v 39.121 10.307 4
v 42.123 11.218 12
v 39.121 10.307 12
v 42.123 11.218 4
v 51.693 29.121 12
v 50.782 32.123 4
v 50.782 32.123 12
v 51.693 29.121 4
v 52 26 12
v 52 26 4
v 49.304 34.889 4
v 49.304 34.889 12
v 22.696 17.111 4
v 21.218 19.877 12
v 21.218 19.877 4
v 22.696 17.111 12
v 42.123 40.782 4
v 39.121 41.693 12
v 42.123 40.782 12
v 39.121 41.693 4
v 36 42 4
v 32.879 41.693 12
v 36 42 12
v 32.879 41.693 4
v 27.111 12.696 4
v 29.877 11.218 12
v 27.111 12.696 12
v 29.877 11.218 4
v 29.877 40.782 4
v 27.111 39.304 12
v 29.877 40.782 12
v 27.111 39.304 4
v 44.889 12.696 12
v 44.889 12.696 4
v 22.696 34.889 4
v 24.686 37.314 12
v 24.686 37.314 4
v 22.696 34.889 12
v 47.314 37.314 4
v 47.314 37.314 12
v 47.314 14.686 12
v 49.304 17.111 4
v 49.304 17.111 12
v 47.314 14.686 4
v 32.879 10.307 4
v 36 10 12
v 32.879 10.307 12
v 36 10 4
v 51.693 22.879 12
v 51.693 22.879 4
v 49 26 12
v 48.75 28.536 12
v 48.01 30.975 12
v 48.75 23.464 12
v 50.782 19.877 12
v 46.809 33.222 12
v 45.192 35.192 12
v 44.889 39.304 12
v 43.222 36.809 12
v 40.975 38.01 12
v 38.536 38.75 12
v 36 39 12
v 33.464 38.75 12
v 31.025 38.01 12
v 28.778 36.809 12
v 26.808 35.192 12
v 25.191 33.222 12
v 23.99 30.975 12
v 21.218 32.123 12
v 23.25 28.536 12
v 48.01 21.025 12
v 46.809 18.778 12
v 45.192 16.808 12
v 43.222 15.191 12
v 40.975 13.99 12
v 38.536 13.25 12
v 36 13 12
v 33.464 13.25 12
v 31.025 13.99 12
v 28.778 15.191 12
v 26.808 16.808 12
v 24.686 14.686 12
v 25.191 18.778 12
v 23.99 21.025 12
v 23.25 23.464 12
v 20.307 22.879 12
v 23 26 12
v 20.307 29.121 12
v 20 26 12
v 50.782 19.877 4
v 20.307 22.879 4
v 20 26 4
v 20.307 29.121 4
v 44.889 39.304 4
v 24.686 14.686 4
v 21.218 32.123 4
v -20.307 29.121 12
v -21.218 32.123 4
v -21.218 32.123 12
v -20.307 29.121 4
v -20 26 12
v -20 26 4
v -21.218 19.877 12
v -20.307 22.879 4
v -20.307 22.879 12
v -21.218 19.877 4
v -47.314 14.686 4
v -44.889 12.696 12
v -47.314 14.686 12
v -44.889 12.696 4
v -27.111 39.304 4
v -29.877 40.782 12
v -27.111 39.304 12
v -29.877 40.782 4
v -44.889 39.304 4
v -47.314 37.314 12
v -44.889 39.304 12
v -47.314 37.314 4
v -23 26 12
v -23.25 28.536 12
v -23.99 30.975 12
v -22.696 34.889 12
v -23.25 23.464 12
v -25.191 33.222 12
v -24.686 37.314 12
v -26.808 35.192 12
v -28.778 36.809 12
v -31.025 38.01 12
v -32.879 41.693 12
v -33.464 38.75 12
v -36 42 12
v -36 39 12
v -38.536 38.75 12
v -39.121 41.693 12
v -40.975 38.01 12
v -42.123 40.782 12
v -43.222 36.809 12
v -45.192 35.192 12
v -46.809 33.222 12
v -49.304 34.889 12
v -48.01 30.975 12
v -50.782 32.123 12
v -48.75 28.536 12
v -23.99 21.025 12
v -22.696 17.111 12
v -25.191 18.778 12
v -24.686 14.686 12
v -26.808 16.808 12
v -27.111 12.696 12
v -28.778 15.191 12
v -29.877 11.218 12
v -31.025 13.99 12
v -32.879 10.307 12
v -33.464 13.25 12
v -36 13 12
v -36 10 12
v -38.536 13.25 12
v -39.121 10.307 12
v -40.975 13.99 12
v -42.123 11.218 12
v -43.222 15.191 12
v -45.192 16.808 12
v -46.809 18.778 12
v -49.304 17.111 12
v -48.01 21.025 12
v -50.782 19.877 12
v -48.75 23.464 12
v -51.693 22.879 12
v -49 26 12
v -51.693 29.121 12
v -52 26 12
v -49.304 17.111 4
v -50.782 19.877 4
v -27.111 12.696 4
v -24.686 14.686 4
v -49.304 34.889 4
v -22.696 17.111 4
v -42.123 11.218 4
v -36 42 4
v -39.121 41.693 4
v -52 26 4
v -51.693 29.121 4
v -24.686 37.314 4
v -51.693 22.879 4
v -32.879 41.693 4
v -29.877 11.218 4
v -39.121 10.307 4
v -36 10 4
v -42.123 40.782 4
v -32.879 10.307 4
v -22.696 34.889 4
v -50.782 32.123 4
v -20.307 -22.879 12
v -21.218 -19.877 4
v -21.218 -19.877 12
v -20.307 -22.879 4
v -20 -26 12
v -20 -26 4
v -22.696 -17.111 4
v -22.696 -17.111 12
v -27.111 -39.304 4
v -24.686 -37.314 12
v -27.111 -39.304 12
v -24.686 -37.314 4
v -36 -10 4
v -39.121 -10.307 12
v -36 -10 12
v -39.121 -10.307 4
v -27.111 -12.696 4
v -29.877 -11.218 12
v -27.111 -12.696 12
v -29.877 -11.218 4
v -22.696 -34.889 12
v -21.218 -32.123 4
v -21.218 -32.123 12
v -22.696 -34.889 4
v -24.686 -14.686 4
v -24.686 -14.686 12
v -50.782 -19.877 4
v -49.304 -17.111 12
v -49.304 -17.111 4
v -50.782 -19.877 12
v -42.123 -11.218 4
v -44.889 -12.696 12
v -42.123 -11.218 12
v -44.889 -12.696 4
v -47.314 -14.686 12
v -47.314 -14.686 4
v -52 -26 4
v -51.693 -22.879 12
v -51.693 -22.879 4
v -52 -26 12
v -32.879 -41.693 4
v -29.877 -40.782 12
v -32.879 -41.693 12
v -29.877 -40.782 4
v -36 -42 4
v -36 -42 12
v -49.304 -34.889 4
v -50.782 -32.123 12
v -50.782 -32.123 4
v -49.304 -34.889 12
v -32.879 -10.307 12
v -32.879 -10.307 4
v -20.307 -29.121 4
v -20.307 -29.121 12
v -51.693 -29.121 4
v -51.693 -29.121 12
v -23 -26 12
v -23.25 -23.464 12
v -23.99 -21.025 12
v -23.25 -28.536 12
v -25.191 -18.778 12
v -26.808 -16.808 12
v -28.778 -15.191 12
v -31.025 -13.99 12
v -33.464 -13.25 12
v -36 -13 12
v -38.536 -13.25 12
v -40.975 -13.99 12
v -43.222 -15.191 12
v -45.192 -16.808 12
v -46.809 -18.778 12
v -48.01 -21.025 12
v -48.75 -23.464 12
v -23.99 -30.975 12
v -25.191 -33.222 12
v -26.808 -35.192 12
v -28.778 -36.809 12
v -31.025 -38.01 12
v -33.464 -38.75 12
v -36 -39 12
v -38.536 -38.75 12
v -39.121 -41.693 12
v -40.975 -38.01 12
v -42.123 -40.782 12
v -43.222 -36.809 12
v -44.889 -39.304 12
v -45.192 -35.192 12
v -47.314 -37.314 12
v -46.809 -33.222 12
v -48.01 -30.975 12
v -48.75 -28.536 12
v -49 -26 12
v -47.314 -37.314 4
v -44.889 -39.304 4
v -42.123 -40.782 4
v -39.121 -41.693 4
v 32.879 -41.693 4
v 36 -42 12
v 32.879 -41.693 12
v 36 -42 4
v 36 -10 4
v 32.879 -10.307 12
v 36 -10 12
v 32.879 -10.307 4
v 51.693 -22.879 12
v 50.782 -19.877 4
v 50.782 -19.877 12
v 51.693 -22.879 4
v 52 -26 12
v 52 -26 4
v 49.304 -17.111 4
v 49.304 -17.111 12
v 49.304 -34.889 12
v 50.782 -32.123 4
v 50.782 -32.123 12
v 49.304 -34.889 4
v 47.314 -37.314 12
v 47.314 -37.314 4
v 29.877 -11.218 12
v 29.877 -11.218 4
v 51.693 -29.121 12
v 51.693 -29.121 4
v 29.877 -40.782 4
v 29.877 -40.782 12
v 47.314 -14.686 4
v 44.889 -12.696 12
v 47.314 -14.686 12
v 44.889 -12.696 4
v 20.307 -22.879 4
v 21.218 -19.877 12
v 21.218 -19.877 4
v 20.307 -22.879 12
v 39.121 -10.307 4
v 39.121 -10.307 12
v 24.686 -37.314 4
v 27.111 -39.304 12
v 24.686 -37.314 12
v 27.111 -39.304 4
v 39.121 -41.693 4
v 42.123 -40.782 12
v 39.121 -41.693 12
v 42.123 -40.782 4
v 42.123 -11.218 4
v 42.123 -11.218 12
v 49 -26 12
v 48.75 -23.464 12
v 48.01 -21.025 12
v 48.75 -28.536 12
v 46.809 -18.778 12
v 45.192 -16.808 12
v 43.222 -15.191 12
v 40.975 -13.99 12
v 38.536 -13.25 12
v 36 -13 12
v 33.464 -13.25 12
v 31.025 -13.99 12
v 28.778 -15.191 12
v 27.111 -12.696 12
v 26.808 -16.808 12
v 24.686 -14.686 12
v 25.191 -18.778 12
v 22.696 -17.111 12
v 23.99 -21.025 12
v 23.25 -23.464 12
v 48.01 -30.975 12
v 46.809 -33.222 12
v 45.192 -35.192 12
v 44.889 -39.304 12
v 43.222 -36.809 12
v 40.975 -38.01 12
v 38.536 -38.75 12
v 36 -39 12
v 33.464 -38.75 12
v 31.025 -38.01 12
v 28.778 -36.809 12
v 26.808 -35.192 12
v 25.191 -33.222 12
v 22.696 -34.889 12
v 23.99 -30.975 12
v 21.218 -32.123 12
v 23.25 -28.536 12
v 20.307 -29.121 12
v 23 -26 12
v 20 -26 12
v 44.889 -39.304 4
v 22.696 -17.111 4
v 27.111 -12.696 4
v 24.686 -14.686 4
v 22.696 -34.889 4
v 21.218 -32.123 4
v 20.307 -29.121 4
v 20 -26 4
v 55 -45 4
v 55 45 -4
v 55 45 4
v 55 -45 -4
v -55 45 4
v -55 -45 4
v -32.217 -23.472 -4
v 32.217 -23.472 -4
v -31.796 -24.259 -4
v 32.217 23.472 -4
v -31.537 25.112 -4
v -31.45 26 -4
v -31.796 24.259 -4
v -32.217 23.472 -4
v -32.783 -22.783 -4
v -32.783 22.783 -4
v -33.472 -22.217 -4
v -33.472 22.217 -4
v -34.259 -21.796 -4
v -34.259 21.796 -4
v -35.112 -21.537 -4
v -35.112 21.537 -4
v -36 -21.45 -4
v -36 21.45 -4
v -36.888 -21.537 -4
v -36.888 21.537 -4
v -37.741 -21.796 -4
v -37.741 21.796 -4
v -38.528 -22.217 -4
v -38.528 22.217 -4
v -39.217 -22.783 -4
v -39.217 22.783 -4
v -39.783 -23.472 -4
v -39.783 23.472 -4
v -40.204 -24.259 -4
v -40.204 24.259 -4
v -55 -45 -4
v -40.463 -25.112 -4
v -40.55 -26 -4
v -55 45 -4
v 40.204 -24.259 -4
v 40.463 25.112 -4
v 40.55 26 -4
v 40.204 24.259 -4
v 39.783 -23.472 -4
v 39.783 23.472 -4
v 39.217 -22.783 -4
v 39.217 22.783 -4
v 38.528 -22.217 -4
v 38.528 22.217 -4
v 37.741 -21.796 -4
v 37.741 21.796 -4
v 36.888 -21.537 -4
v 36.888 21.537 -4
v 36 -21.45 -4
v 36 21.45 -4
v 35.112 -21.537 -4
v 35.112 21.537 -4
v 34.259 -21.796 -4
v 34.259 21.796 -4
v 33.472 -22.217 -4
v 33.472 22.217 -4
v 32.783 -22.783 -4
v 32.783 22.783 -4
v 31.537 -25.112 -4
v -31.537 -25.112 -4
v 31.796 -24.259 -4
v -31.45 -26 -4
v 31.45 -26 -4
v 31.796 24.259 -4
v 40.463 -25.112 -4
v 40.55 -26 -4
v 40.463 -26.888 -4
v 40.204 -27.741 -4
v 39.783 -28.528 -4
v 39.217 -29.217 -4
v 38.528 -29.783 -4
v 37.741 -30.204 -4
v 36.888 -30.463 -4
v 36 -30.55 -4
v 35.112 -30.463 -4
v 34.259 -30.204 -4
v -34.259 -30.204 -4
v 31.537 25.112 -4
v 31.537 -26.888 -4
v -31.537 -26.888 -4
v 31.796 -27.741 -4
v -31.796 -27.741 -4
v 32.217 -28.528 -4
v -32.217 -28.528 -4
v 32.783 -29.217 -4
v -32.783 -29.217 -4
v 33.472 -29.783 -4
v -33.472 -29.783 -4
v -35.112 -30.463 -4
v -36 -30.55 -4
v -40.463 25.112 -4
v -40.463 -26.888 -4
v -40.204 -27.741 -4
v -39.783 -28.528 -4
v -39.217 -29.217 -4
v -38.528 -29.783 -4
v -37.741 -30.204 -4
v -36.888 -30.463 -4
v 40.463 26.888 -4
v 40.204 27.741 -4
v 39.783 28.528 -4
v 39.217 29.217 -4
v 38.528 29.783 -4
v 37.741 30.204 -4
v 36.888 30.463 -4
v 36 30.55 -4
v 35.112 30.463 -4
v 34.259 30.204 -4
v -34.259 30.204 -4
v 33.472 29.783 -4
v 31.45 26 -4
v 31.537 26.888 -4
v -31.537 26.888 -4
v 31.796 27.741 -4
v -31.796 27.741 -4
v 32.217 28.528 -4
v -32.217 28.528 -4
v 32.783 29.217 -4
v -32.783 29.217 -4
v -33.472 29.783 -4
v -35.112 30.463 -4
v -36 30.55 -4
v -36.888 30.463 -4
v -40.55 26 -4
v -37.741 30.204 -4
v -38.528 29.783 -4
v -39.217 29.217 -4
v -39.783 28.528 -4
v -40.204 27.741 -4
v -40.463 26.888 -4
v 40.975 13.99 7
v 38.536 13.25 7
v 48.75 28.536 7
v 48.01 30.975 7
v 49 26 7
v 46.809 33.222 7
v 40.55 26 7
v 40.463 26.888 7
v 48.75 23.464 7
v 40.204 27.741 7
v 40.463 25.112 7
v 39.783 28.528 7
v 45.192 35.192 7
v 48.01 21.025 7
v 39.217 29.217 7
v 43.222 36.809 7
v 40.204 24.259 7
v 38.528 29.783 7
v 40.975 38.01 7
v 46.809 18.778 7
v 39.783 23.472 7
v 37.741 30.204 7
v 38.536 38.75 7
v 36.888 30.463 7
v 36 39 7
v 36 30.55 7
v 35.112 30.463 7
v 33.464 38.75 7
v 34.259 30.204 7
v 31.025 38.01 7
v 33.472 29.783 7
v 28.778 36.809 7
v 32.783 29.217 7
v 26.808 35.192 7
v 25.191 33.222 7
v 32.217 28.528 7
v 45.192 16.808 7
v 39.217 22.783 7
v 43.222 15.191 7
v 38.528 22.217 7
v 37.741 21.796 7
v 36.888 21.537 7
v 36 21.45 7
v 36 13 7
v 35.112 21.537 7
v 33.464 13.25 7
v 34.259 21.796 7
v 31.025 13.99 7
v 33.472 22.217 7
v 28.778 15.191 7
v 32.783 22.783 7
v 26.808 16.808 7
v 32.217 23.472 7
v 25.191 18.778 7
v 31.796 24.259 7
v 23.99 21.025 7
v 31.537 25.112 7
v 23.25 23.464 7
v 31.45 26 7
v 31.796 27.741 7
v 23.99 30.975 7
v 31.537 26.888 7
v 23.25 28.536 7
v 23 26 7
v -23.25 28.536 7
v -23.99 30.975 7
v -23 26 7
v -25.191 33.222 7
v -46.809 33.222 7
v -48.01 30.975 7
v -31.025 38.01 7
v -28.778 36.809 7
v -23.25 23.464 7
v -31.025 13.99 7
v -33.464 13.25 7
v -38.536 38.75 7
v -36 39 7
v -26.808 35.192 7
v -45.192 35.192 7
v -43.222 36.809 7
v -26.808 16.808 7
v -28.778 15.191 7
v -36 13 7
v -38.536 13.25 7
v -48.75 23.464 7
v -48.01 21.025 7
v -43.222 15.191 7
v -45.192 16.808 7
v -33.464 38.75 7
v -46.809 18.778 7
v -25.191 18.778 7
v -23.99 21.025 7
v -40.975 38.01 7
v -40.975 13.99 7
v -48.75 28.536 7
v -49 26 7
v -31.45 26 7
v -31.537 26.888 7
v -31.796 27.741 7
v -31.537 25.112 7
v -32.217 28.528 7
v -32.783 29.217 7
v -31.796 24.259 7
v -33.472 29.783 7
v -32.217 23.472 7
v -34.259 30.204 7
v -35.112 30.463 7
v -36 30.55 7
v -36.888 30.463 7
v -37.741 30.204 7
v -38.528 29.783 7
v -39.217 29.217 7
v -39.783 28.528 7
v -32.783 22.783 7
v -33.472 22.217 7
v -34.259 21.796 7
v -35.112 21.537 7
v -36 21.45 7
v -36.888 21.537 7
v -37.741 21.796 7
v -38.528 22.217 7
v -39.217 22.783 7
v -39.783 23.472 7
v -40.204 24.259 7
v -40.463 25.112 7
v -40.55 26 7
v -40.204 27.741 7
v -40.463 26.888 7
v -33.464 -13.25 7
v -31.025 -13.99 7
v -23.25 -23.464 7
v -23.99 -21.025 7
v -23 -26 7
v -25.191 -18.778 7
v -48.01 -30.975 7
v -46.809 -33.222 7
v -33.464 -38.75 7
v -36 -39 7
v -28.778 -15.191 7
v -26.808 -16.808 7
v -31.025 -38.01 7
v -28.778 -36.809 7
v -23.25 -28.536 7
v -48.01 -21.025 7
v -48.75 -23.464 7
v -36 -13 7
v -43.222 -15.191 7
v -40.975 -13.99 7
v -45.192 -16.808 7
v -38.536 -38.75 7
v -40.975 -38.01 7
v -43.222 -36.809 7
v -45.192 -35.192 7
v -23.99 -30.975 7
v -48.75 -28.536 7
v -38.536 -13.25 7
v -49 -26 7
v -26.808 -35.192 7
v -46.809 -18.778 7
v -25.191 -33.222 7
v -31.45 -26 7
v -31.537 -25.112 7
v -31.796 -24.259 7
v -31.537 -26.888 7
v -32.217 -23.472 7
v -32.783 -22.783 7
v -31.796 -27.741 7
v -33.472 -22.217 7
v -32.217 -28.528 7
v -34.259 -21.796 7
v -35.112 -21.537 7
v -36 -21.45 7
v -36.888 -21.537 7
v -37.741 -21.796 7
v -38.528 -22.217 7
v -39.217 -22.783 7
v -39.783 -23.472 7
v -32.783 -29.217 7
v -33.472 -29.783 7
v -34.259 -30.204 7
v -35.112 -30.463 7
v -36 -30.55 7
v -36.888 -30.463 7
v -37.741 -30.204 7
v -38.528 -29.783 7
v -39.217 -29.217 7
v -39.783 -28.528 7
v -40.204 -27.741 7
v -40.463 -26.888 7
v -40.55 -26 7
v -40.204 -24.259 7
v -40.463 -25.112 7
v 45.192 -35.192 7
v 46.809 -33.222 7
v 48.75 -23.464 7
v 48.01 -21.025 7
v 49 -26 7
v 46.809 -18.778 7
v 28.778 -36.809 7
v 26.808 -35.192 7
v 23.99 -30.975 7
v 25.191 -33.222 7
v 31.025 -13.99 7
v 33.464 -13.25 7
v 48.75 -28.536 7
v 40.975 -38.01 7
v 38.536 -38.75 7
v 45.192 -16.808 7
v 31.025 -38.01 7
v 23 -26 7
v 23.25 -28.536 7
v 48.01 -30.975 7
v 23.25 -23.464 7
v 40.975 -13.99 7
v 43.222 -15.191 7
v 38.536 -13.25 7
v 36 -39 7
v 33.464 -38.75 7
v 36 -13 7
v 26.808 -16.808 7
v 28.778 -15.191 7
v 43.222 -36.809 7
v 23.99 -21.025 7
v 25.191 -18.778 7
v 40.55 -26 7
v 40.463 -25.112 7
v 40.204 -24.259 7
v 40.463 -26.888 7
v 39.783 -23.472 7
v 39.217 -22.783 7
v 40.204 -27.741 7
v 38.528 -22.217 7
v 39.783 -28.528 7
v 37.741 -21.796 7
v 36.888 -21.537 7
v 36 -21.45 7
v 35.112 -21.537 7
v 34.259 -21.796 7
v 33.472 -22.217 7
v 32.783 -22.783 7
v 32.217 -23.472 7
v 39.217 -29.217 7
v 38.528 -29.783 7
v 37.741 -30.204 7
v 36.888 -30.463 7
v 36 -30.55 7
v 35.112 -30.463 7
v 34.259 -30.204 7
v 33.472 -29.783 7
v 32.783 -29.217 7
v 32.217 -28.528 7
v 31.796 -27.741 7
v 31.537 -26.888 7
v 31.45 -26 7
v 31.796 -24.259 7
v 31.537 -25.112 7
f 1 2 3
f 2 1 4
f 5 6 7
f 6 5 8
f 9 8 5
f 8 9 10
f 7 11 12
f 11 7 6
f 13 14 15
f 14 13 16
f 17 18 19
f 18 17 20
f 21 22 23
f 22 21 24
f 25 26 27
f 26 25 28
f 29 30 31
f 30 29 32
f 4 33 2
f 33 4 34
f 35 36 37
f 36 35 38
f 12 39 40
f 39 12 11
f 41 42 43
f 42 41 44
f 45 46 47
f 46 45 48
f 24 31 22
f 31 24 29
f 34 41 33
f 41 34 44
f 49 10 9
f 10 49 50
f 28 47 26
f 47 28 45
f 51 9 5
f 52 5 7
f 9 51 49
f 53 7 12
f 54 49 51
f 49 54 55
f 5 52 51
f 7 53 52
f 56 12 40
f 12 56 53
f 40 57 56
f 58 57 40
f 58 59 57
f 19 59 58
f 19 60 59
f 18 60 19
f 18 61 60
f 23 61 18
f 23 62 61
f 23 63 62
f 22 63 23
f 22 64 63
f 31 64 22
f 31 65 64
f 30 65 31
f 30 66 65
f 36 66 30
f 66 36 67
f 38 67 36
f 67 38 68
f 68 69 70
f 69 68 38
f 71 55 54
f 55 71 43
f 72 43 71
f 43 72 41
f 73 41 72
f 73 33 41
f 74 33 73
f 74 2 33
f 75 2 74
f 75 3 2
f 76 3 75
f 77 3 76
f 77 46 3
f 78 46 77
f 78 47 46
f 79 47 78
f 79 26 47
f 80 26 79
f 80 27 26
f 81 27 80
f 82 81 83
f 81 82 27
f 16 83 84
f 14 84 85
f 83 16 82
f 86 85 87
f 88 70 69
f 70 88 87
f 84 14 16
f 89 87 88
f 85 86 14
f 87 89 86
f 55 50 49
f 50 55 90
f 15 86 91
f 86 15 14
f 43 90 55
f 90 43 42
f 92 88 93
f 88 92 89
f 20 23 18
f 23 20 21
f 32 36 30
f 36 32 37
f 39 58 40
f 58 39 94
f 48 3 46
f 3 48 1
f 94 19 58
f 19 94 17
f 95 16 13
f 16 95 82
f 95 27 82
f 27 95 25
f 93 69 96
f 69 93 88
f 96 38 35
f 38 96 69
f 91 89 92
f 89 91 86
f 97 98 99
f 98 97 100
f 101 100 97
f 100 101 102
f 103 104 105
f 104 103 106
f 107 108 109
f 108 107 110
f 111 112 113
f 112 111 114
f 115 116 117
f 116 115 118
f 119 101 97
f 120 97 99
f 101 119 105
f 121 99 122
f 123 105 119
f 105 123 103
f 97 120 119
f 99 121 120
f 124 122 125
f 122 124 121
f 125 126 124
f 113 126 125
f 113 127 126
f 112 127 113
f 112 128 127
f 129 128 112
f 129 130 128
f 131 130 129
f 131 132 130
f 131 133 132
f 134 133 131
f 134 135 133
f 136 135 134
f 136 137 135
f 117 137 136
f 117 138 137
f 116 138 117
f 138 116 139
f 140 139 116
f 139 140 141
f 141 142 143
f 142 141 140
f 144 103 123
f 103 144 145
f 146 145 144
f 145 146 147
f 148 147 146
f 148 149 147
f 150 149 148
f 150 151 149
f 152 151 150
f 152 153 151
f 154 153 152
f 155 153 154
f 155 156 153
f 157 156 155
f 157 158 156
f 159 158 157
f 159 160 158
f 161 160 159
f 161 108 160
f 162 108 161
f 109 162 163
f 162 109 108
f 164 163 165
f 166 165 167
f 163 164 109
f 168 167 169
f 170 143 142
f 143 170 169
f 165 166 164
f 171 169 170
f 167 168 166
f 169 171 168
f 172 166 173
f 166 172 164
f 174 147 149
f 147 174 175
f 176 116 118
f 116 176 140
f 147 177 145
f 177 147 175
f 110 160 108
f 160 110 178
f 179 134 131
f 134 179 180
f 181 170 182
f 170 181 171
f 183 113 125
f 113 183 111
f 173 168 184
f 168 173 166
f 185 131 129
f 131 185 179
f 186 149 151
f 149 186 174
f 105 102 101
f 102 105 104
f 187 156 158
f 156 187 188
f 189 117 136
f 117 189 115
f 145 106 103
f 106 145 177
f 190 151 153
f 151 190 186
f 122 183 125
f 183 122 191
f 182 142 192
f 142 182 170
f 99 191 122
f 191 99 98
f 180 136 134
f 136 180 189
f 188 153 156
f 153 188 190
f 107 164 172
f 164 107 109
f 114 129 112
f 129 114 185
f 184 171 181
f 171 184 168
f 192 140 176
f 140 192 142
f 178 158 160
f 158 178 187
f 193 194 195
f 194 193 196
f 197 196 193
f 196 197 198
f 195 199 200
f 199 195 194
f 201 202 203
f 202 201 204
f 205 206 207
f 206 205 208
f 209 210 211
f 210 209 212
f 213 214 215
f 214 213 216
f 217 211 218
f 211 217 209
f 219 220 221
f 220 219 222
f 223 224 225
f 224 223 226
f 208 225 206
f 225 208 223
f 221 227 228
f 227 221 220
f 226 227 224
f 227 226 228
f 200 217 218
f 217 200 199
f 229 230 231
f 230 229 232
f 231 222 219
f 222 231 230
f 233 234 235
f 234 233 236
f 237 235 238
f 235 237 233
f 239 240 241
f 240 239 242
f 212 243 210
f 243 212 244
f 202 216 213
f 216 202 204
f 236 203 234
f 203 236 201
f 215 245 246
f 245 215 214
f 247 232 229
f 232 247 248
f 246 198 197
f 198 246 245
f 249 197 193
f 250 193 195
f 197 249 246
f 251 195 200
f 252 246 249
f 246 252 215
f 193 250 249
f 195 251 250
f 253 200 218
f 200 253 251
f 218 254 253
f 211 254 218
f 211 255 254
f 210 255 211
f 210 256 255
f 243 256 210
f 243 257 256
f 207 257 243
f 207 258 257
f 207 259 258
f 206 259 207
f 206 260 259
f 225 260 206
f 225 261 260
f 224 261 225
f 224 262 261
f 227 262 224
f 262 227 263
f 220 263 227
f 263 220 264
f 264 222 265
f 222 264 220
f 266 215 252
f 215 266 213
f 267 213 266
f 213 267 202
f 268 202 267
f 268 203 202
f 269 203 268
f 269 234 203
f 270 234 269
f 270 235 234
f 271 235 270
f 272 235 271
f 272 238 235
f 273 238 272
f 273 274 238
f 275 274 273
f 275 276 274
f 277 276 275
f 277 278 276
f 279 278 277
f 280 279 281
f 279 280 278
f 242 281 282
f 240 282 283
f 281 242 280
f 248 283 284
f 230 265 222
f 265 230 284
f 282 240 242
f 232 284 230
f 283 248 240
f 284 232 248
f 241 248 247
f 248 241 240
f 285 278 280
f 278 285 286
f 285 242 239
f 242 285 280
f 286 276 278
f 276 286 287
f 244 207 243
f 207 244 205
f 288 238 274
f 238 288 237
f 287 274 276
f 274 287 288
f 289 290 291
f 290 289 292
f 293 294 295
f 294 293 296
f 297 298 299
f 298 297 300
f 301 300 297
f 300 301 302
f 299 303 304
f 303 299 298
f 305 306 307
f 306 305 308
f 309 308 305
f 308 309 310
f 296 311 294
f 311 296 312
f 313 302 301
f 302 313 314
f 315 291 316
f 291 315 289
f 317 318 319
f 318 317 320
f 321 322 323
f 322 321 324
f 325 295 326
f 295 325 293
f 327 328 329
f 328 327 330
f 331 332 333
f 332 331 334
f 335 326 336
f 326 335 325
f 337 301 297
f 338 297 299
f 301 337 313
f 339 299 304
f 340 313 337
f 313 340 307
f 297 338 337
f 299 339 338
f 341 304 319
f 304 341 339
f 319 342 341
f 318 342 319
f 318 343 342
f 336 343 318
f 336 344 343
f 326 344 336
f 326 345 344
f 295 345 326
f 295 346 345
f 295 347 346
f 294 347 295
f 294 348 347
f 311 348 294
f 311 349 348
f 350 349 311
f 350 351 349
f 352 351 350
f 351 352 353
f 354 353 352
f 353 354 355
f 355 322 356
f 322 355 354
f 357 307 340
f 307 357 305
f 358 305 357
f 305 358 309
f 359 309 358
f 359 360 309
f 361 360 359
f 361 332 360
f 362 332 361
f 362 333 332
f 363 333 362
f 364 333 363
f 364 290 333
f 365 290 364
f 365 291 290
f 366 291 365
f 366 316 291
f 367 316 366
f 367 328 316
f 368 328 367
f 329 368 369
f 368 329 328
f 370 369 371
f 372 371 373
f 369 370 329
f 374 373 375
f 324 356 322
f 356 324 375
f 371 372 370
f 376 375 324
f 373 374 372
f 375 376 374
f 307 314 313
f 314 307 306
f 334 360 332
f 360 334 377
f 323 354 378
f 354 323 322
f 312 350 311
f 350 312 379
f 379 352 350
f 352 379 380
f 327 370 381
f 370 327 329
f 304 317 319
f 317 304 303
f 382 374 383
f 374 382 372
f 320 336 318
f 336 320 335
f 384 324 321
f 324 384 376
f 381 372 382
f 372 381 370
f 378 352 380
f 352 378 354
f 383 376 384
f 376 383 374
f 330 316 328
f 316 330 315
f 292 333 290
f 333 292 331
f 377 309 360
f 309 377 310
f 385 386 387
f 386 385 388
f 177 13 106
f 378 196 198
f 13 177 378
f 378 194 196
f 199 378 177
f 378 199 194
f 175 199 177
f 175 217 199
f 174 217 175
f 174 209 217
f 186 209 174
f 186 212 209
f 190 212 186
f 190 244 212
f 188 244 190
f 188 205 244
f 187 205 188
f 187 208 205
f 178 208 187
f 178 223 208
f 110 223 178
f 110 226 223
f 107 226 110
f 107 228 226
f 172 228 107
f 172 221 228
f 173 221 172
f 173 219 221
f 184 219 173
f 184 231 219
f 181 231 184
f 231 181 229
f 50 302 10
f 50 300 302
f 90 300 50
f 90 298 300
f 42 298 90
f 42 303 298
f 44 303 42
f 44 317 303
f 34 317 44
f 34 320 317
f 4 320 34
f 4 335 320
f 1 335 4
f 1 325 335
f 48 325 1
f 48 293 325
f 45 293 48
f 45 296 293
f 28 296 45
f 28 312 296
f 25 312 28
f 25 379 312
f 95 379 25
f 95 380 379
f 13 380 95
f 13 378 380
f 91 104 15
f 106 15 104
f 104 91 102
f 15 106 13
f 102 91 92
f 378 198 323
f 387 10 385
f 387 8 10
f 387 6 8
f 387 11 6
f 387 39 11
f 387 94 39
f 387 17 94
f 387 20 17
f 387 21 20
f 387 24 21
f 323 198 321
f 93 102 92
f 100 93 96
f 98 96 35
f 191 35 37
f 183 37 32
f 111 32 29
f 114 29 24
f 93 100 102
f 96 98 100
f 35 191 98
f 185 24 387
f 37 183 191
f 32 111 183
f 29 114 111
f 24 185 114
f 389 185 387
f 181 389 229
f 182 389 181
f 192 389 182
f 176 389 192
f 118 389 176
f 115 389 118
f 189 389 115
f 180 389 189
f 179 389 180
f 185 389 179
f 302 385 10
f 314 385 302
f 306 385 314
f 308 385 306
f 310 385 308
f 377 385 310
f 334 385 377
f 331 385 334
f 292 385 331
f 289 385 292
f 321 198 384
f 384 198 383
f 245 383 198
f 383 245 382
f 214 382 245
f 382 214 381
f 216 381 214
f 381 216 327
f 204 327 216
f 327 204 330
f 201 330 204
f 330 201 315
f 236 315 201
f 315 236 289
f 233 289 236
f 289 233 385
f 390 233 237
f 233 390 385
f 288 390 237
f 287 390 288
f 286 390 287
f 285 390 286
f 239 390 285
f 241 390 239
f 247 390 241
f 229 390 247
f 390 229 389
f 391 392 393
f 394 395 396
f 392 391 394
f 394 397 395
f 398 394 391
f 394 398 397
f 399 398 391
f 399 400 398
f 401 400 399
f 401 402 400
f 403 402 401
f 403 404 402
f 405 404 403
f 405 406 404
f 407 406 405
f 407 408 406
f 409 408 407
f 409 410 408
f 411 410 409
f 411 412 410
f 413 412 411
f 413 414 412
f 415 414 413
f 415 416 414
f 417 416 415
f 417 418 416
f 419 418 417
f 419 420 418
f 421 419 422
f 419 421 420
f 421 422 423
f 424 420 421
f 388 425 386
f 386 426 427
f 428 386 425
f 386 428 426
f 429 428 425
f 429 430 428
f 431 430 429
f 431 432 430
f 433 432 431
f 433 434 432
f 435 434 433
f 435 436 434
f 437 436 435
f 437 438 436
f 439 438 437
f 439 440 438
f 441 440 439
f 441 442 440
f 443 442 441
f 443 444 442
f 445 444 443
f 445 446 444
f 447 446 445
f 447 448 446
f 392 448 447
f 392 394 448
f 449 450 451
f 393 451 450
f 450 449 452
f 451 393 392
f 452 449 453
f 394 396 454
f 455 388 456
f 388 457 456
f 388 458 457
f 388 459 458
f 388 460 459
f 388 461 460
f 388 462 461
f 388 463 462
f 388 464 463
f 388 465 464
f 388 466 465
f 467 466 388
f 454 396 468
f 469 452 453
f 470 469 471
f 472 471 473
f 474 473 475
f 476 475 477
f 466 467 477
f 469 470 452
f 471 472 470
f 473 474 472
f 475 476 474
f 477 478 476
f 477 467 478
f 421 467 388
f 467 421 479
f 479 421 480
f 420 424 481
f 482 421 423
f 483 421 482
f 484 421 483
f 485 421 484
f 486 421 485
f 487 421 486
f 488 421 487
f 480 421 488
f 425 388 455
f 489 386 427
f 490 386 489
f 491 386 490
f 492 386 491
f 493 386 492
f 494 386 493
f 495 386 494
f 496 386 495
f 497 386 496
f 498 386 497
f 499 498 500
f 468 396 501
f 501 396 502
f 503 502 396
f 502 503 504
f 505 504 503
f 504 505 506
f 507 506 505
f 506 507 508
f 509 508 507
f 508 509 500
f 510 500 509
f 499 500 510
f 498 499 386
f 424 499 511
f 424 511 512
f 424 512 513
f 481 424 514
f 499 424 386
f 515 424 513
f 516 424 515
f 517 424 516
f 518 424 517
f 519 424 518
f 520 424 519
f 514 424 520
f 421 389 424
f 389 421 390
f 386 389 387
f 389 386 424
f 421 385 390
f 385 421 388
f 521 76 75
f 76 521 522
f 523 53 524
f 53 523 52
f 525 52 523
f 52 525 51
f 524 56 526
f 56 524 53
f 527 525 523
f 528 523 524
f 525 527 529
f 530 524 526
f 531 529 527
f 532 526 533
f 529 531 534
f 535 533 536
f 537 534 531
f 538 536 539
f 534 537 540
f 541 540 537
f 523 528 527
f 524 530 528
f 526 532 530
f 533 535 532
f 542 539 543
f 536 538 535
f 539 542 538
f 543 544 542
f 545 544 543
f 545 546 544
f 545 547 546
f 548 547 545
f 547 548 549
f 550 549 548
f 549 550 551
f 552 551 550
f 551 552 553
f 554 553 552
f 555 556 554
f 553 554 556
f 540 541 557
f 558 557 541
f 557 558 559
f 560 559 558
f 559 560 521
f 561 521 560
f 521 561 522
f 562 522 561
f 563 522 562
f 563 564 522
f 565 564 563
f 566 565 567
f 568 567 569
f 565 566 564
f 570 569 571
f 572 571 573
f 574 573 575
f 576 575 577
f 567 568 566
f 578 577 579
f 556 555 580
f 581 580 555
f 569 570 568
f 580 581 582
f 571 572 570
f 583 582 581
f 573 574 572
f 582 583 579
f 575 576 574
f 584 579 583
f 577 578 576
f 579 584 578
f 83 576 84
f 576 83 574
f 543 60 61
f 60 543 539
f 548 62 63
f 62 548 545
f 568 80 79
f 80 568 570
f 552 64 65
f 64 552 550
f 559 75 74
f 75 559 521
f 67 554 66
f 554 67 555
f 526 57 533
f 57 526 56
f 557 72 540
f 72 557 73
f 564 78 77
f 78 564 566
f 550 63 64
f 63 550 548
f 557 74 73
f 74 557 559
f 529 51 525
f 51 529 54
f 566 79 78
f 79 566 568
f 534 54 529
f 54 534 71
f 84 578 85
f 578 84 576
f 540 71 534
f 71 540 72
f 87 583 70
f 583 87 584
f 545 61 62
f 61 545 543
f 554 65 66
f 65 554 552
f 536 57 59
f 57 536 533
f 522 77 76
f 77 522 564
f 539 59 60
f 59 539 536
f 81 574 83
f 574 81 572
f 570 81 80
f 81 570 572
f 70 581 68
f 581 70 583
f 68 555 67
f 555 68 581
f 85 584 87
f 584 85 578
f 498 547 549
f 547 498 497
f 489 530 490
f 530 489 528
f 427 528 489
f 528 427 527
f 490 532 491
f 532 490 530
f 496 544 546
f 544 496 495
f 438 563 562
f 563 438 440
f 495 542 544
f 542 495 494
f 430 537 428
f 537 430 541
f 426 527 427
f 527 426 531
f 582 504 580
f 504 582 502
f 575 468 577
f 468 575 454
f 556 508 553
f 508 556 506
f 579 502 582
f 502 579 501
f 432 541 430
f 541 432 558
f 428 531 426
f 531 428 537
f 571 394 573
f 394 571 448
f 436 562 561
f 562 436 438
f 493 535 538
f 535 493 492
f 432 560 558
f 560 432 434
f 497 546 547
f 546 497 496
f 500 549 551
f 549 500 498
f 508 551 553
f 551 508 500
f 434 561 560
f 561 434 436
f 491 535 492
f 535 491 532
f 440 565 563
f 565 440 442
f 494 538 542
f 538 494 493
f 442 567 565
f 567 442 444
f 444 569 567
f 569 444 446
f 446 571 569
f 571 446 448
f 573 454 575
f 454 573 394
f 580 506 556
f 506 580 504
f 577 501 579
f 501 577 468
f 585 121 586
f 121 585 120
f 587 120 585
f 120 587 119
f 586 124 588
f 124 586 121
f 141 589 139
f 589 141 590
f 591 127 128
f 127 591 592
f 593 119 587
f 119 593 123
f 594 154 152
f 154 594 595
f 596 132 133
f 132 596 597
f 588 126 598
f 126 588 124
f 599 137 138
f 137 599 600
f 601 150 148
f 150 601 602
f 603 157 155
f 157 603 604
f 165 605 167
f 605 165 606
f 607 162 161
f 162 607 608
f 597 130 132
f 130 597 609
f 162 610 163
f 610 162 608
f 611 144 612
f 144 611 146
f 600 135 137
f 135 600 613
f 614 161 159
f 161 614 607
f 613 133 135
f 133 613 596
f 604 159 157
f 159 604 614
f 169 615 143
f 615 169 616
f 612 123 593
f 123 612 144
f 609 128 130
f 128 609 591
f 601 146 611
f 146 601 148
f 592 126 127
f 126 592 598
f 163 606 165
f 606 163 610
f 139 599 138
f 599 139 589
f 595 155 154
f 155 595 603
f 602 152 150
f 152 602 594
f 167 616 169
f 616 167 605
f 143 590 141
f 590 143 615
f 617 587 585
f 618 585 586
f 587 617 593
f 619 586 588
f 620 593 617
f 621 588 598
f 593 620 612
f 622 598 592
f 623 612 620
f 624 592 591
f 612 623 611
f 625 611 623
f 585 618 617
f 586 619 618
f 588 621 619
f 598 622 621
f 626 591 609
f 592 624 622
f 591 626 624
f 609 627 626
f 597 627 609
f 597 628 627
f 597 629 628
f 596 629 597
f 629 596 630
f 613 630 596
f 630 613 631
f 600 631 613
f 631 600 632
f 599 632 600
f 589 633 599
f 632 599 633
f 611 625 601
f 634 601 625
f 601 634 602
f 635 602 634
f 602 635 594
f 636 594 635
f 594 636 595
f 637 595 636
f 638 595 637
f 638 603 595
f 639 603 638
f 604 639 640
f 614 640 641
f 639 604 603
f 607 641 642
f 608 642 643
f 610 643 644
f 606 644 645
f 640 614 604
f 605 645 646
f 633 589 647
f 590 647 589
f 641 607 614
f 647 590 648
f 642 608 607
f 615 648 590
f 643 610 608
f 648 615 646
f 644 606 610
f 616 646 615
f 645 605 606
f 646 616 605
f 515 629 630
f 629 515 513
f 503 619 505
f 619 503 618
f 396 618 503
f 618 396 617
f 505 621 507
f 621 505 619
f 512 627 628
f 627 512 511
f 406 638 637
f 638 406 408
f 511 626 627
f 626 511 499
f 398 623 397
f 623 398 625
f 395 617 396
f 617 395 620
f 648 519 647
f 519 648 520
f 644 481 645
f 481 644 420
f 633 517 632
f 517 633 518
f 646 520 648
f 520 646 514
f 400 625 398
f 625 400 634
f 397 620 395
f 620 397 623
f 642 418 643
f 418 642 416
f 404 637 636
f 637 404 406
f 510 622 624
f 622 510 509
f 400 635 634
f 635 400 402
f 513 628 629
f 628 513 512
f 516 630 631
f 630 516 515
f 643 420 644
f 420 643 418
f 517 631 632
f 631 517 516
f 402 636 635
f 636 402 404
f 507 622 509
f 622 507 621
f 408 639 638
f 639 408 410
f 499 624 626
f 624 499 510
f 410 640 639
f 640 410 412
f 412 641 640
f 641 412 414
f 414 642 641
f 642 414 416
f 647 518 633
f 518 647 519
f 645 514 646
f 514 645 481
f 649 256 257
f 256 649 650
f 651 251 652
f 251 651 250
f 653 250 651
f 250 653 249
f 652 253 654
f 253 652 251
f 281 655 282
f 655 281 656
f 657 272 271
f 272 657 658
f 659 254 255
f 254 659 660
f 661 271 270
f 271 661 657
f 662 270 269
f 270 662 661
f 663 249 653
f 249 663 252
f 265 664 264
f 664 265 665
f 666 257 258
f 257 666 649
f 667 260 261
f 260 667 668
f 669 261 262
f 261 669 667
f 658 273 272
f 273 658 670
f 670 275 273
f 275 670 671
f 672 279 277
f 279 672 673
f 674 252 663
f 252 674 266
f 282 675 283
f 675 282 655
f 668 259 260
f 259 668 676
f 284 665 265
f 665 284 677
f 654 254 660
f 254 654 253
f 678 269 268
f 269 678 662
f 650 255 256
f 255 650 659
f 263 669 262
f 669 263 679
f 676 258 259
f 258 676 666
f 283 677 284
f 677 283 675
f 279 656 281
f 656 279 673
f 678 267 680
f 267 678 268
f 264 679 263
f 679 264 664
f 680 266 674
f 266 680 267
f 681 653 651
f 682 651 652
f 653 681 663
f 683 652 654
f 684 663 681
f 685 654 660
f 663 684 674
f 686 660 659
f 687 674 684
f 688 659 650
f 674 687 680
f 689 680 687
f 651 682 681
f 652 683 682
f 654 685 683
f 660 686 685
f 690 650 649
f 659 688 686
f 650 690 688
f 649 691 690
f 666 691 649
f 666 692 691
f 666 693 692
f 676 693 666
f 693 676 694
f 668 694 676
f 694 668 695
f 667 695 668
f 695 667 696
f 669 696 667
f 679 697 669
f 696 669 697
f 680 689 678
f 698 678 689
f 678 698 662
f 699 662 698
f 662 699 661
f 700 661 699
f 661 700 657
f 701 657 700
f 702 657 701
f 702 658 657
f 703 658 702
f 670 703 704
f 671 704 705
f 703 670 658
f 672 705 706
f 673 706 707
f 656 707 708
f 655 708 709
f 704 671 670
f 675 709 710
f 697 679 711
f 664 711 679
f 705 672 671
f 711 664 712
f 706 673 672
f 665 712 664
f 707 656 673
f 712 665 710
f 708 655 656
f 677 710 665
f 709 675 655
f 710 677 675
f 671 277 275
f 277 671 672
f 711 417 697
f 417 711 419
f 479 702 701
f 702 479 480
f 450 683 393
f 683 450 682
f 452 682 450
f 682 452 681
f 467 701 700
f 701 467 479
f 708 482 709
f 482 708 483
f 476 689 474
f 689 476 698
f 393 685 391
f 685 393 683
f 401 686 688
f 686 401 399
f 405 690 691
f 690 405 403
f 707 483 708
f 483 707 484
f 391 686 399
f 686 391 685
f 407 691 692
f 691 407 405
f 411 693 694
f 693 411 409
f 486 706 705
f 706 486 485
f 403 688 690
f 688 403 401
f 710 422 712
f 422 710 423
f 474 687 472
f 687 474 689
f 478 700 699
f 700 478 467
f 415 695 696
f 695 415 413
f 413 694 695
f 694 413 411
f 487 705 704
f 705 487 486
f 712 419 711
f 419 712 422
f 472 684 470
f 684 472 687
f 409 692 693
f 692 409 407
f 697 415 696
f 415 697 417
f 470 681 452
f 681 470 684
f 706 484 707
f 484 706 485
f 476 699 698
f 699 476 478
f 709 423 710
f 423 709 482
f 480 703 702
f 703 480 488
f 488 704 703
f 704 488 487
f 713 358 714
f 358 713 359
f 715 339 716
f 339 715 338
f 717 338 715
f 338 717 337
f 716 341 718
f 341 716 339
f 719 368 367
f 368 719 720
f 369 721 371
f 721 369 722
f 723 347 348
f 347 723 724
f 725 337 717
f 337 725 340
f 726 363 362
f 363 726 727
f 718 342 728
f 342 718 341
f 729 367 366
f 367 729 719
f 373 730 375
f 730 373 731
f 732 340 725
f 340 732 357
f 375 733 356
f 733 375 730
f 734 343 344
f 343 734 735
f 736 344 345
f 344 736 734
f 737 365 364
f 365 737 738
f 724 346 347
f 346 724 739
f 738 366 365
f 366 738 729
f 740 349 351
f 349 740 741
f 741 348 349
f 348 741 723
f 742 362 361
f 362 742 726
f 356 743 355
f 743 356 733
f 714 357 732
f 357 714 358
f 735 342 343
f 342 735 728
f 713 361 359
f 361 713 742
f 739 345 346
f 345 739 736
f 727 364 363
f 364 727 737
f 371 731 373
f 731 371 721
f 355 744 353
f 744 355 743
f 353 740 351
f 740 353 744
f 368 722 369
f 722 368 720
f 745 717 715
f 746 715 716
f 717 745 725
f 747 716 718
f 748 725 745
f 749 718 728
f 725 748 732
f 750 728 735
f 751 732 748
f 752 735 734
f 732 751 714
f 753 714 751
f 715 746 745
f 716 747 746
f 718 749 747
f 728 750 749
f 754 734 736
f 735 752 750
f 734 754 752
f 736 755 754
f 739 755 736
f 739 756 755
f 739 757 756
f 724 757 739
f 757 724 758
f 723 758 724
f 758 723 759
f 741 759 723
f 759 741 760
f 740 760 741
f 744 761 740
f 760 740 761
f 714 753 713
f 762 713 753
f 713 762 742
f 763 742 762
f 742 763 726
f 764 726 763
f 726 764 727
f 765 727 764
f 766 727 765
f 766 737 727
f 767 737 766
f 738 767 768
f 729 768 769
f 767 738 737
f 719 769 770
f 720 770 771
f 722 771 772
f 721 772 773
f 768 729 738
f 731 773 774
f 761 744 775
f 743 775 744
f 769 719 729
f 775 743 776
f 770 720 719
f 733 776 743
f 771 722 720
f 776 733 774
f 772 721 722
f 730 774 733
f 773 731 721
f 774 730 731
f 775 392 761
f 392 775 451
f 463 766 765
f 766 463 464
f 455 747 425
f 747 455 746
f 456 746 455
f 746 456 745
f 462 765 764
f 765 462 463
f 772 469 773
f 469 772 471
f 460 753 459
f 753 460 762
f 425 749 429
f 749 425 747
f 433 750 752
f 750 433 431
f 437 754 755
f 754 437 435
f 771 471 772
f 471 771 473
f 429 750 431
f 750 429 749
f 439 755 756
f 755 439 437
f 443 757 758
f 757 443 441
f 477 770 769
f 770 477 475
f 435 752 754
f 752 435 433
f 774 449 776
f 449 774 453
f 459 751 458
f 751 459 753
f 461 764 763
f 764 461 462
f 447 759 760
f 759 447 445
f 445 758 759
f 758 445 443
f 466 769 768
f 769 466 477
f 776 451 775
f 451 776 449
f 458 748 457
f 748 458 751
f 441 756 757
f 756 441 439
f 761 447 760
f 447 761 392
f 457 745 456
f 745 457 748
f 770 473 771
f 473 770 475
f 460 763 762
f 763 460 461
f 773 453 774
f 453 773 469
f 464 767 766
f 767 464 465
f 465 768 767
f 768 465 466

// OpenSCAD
$fn = 32;

// ----------------------------------------------------------------------
// Socket pad plate
// bosses with counterbored sockets for the screws
// ----------------------------------------------------------------------

// --- parameters (mm) ---
base_t = 8;            // base plate thickness
boss_h = 8;            // boss height above the base plate
boss_d = 32;           // boss diameter
socket_d = 26;         // socket diameter
socket_depth = 5;      // socket depth from the boss face
bolt_d = 9.1;          // screw clearance hole through the socket floor
plate = [110, 90, 8];  // overall size (x, y, z)
edge = 19;             // boss centre offset from the plate edge
pads = 4;              // boss count, one per corner

// --- derived feature positions (mm) ---
height = base_t + boss_h;        // = 16   overall height of the part
corner_x = plate[0] / 2 - edge;  // = 36   boss centre X
corner_y = plate[1] / 2 - edge;  // = 26   boss centre Y
feature_centers = [
  [corner_x, corner_y],
  [-corner_x, corner_y],
  [-corner_x, -corner_y],
  [corner_x, -corner_y]
];   // boss centres: sockets, holes and the pads themselves are placed from here

// base plate, bosses on feature_centers, socket + through hole in each
difference() {
  union() {
    cube(plate, center = true);
    for (centre = feature_centers)
      translate([centre[0], centre[1], plate[2] / 2 - 1])
        cylinder(d = boss_d, h = boss_h + 1);
  }
  for (centre = feature_centers) {
    translate([centre[0], centre[1], plate[2] / 2 + boss_h - socket_depth])
      cylinder(d = socket_d, h = socket_depth + 1);
    translate([centre[0], centre[1], -height])
      cylinder(d = bolt_d, h = 2 * height + 2);  // through the socket floor
  }
}
